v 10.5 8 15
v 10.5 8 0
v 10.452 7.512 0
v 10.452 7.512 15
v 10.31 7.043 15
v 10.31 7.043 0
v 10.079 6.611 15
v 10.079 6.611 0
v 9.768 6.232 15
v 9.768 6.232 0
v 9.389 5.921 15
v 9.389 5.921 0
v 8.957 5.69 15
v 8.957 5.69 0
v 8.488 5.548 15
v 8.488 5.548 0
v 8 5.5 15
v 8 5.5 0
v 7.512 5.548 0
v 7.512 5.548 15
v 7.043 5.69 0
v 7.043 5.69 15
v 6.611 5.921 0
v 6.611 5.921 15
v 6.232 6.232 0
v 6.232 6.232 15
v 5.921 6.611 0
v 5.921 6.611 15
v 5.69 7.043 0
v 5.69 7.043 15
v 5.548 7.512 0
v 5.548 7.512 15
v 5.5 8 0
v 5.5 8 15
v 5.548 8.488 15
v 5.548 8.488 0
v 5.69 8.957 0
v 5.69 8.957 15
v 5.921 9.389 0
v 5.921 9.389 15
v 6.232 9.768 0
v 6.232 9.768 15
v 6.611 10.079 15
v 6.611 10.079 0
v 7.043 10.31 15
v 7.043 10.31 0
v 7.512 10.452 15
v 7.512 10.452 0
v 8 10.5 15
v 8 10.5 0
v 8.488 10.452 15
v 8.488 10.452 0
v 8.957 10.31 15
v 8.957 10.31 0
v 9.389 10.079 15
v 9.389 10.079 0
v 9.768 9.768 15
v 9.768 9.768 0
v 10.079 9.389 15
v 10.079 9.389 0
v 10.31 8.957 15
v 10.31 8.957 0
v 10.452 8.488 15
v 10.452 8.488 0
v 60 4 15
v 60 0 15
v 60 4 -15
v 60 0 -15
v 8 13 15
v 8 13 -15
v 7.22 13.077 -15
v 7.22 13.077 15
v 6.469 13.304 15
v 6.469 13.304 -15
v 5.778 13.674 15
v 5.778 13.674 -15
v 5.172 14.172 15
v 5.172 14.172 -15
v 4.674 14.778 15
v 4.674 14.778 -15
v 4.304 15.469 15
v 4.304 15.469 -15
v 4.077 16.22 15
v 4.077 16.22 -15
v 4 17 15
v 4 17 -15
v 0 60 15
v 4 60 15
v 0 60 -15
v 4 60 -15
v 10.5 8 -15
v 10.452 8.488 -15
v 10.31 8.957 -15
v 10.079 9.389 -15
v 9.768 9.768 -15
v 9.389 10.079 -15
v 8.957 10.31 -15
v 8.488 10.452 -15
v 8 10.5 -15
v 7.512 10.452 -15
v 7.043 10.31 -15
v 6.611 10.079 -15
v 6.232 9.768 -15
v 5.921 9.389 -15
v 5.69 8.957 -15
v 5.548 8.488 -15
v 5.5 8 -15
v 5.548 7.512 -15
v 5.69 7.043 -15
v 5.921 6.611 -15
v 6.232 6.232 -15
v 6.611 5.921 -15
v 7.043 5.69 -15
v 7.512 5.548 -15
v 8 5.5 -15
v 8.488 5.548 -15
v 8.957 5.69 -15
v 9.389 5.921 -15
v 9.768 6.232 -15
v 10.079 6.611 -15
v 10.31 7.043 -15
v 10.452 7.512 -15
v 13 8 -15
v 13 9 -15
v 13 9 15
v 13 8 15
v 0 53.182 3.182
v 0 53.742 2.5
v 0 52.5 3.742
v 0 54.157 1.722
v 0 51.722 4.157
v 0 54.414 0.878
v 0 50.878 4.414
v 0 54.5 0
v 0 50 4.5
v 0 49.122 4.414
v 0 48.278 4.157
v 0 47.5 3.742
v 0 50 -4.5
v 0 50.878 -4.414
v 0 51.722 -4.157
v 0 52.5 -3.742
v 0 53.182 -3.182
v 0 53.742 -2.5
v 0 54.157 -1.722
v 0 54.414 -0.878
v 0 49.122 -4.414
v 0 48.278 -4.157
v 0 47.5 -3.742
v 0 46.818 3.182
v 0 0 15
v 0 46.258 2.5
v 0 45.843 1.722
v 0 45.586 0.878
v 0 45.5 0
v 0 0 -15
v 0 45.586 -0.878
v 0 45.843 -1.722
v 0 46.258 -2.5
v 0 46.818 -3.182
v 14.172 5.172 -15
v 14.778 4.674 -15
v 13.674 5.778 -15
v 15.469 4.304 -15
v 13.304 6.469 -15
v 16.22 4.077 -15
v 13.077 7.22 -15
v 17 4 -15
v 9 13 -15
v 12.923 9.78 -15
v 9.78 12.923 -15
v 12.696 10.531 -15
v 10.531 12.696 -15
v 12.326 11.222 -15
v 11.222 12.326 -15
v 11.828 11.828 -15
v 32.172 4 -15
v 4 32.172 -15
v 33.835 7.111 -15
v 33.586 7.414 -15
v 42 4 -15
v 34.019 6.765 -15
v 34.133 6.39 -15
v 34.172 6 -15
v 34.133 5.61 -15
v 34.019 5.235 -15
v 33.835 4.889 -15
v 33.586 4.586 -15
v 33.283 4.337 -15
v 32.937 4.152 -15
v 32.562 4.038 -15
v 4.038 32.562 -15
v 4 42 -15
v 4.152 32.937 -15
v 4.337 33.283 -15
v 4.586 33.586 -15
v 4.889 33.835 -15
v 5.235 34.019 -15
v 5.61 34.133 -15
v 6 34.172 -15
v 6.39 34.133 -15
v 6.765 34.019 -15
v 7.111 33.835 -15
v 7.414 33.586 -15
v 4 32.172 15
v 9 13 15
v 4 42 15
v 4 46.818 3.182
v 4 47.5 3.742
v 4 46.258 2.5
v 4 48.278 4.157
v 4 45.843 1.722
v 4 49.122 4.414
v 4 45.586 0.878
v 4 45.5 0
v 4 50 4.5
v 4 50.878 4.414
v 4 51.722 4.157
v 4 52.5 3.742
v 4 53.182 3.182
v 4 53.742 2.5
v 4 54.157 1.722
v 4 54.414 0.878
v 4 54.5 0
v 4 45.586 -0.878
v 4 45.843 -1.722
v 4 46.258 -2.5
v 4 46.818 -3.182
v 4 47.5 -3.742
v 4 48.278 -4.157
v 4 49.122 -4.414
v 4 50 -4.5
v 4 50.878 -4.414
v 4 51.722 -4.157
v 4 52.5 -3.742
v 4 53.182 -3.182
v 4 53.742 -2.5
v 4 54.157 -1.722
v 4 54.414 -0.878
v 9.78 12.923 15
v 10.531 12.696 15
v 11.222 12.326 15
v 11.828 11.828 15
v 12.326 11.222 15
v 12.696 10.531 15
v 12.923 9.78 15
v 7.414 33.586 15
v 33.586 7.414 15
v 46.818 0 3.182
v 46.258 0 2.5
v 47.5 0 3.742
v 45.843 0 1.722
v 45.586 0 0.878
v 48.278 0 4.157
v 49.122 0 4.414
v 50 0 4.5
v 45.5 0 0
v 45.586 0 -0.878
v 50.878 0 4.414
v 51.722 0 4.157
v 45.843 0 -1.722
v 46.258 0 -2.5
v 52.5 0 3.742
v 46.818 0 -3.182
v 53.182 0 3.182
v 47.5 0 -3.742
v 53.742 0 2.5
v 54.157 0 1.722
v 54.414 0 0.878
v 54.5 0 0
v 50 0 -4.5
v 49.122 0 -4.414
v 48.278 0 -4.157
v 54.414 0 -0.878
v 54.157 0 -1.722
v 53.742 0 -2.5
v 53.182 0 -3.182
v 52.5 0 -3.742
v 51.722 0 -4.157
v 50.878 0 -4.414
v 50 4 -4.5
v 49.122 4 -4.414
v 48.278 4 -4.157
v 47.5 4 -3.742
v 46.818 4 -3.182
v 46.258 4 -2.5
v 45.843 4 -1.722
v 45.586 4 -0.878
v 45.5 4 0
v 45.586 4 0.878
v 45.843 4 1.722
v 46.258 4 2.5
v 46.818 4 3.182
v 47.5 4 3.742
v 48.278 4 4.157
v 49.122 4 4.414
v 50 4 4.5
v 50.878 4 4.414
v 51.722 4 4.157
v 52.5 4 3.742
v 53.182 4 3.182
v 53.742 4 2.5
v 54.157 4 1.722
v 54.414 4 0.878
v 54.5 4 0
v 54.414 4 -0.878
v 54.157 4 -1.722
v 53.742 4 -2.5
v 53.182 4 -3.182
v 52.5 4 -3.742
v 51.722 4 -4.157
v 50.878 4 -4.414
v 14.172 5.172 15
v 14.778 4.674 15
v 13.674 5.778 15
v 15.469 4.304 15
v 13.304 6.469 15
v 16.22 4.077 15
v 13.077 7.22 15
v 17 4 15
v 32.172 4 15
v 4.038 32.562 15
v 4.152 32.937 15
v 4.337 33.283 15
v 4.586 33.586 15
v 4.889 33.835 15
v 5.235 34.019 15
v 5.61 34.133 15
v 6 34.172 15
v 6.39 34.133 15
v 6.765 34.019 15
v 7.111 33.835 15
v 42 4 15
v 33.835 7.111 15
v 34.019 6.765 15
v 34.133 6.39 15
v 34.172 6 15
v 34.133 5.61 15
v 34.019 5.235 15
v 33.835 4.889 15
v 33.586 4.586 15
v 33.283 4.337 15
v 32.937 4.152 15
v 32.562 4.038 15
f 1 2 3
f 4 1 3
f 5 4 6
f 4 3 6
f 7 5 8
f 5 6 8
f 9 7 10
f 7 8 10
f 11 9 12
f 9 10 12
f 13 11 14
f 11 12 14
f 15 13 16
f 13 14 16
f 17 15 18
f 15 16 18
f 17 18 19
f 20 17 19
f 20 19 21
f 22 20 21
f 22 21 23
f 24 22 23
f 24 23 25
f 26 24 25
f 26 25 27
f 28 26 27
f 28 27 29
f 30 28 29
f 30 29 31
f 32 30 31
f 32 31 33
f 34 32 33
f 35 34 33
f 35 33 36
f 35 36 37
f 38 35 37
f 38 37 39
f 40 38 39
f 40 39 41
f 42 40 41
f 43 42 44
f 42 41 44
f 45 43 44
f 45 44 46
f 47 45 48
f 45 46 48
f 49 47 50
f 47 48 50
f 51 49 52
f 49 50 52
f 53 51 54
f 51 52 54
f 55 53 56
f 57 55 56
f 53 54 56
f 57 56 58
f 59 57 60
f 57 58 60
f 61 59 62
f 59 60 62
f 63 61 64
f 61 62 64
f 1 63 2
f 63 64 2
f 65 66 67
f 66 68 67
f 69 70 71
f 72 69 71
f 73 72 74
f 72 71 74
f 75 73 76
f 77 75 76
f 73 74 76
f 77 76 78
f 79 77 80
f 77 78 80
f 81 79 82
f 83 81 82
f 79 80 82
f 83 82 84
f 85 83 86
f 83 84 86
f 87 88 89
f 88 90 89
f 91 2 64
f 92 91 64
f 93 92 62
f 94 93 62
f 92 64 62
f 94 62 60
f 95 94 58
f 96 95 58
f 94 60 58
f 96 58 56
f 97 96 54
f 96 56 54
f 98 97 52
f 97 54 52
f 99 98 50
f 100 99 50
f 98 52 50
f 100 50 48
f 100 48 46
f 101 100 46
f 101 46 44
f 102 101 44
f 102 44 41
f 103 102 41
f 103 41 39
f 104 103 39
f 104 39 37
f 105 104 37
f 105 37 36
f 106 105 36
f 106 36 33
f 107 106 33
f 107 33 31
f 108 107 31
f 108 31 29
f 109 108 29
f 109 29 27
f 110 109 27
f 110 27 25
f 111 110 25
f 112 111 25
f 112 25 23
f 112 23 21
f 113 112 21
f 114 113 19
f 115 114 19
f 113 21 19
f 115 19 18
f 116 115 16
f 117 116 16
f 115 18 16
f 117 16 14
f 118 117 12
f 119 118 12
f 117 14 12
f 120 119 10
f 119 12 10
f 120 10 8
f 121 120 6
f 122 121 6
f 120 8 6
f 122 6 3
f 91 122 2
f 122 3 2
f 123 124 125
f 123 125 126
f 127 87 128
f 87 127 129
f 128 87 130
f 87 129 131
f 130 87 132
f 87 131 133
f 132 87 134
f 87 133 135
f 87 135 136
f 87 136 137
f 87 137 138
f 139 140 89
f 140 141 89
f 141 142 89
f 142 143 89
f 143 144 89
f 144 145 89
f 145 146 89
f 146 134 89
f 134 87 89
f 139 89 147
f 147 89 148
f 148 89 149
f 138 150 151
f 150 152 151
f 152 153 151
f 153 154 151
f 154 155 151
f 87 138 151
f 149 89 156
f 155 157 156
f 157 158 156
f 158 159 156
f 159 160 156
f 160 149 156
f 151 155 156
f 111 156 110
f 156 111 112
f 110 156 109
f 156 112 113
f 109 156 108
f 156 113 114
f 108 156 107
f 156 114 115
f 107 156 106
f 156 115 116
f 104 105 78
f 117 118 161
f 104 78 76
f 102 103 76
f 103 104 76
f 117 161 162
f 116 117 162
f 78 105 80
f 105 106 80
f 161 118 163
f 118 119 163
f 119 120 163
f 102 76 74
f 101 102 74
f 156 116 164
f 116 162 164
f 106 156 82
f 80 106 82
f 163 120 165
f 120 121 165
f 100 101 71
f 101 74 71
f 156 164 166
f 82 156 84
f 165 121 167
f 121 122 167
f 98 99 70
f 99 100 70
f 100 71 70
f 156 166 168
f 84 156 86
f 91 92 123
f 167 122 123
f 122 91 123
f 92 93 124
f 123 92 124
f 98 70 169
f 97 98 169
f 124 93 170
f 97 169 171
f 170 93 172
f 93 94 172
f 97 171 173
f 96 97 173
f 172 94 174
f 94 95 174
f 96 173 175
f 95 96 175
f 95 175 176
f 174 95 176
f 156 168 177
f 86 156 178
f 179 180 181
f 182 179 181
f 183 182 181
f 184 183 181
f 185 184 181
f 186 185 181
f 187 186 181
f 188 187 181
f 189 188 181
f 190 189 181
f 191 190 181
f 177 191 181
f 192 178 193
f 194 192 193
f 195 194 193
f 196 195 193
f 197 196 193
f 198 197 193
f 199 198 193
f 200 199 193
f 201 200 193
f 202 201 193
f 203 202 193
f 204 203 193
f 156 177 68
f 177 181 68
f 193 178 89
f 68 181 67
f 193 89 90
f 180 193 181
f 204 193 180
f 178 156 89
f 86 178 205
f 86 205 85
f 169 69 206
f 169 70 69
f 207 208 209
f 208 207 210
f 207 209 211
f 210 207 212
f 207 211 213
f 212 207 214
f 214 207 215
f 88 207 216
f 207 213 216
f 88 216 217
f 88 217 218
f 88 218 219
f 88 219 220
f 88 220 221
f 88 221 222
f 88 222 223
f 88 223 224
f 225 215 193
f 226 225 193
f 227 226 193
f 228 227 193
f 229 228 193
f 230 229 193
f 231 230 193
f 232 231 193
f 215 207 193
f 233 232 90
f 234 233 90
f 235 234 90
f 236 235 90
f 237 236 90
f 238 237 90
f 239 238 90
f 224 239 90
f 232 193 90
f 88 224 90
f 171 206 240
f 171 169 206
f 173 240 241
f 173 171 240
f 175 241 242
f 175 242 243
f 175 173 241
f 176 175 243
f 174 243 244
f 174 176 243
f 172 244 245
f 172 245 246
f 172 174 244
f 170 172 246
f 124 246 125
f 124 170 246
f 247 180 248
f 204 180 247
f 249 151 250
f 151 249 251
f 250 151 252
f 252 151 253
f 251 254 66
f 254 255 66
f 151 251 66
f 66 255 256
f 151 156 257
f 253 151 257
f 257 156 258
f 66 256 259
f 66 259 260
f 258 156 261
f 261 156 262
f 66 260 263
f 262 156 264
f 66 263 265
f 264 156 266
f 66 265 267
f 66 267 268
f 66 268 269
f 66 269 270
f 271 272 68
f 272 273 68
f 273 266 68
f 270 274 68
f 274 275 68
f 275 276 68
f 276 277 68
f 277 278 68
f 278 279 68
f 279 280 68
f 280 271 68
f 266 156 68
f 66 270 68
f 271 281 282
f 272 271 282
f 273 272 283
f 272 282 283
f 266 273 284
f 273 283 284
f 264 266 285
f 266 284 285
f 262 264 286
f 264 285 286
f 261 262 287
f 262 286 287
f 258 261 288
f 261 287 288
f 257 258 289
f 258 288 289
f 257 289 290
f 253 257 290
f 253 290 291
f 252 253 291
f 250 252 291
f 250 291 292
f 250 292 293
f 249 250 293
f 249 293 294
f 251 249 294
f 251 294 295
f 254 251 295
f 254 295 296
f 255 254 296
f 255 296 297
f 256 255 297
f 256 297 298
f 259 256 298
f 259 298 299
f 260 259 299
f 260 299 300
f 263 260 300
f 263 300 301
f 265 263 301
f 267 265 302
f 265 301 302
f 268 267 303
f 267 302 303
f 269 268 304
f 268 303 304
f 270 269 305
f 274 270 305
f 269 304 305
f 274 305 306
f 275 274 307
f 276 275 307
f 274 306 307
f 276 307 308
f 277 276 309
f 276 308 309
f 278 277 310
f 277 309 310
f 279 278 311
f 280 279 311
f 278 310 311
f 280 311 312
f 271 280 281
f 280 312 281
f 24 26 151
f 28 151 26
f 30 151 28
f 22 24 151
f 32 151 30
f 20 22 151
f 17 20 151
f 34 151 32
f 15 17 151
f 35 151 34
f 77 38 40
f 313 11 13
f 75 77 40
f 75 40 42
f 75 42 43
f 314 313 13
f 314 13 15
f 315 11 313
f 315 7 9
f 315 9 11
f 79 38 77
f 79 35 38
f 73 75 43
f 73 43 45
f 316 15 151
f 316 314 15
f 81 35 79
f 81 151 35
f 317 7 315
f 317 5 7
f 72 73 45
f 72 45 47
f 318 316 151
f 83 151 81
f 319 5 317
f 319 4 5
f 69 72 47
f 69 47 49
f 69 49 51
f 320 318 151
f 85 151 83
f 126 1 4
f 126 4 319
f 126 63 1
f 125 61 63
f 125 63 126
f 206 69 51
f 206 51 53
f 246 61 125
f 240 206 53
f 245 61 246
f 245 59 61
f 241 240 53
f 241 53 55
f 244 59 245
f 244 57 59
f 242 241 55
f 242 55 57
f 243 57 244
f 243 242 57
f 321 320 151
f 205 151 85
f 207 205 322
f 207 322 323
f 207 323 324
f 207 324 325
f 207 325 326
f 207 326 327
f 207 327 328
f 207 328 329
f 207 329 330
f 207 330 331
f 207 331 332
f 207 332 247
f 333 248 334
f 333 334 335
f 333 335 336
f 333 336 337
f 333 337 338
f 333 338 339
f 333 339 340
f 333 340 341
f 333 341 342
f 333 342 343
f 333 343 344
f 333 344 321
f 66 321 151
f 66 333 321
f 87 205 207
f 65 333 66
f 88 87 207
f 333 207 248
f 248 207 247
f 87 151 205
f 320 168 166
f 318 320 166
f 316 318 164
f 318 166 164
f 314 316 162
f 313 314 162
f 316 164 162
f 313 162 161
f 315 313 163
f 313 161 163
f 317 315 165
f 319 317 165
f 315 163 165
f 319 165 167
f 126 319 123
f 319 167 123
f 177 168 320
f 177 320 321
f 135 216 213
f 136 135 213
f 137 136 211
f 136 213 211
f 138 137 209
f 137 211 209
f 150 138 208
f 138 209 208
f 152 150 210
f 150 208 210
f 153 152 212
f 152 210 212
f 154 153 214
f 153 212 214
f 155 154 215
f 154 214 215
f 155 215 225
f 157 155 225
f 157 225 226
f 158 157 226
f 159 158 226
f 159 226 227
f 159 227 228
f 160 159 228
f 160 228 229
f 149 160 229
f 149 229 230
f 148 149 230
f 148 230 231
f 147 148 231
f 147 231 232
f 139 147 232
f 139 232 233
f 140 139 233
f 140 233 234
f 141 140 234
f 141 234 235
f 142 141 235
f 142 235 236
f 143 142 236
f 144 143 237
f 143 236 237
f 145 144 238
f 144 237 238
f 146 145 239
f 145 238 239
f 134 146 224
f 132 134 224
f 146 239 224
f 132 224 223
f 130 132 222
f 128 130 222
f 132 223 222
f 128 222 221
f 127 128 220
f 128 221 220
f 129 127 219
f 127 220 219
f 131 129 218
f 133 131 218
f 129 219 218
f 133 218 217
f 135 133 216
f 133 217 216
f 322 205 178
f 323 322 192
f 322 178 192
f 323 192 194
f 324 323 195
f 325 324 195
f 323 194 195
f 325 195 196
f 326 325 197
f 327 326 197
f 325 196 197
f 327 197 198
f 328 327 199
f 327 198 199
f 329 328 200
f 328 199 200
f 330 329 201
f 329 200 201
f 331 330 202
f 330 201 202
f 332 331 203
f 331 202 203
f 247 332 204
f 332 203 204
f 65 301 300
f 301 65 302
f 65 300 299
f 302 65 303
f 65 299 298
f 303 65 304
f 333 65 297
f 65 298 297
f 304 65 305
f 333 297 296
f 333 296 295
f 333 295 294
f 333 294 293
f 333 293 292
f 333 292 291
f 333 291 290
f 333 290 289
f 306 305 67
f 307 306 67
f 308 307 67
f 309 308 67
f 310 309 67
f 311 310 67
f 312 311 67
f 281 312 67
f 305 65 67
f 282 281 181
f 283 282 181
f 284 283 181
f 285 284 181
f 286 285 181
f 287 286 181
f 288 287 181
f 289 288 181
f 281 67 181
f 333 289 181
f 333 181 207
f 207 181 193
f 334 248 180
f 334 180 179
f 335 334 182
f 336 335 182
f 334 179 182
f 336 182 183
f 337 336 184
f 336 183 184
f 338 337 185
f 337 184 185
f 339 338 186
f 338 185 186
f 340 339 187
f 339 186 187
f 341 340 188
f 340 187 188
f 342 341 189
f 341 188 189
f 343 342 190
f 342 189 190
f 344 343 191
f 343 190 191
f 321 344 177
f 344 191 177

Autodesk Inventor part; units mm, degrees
sketch "Skizze_1" plane through (0, 0, 0) normal (0, 0, 1) x (1, 0, 0)
  line L0 (0, 0) -> (60, 0)
  line L1 (60, 0) -> (60, 4)
  line L2 (60, 4) -> (42, 4)
  line L3 (42, 4) -> (4, 42)
  line L4 (4, 42) -> (4, 60)
  line L5 (4, 60) -> (0, 60)
  line L6 (0, 60) -> (0, 0)
extrude "Extrusion1" add sketch "Skizze_1" along normal mid plane 30
sketch "Skizze_2" plane through (0, 0, 0) normal (0, 0, 1) x (1, 0, 0)
  arc A0 (4, 17) -> (8, 13) centre (8, 17) ccw
  line L0 (8, 13) -> (9, 13)
  arc A1 (13, 9) -> (9, 13) centre (9, 9) ccw
  line L1 (13, 9) -> (13, 8)
  arc A2 (13, 8) -> (17, 4) centre (17, 8) ccw
  line L2 (17, 4) -> (32.1716, 4)
  arc A3 (32.1716, 4) -> (33.5858, 7.4142) centre (32.1716, 6) ccw
  line L3 (33.5858, 7.4142) -> (7.4142, 33.5858)
  arc A4 (7.4142, 33.5858) -> (4, 32.1716) centre (6, 32.1716) ccw
  line L4 (4, 32.1716) -> (4, 17)
extrude "Extrusion2" cut sketch "Skizze_2" along normal mid plane 32
sketch "Skizze_3" plane through (0, 0, 0) normal (0, 0, 1) x (1, 0, 0)
  circle A0 centre (8, 8) radius 2.5
extrude "Extrusion3" cut sketch "Skizze_3" along normal mid plane 32
sketch "Sketch4" plane through (0, 0, 15) normal (0, -1, 0) x (1, 0, 0)
  point P0 (50, -15)
hole "Drilling 2" at (50, 0, 0) direction (0, 1, 0) diameter 9 depth 5
sketch "Sketch5" plane through (0, 0, 15) normal (-1, 0, 0) x (0, 0, 1)
  point P0 (-15, 50)
hole "Drilling 3" at (0, 50, 0) direction (1, 0, 0) diameter 9 depth 5
ref_plane "cover_panel_hole_a_XY" through (8, 8, 15) normal (0, 0, 1) x (1, 0, 0)
ref_plane "cover_panel_hole_a_YZ" through (8, 8, 15) normal (1, 0, 0) x (0, 1, 0)
ref_plane "cover_panel_hole_a_ZX" through (8, 8, 15) normal (0, 1, 0) x (0, 0, 1)
ref_plane "cover_panel_hole_b_XY" through (8, 8, -15) normal (0, 0, -1) x (1, 0, 0)
ref_plane "cover_panel_hole_b_YZ" through (8, 8, -15) normal (1, 0, 0) x (0, -1, 0)
ref_plane "cover_panel_hole_b_ZX" through (8, 8, -15) normal (0, -1, 0) x (0, 0, -1)
ref_plane "side_1_XY" through (0, 30, 0) normal (-1, 0, 0) x (0, 0, 1)
ref_plane "side_1_YZ" through (0, 30, 0) normal (0, 0, 1) x (0, 1, 0)
ref_plane "side_1_ZX" through (0, 30, 0) normal (0, 1, 0) x (-1, 0, 0)
ref_plane "side_2_XY" through (30, 0, 0) normal (0, -1, 0) x (0, 0, 1)
ref_plane "side_2_YZ" through (30, 0, 0) normal (0, 0, 1) x (-1, 0, 0)
ref_plane "side_2_ZX" through (30, 0, 0) normal (-1, 0, 0) x (0, -1, 0)
properties part number "MayTec 1.46.20639_Angle Alu 60x60, D9.0, B30"
